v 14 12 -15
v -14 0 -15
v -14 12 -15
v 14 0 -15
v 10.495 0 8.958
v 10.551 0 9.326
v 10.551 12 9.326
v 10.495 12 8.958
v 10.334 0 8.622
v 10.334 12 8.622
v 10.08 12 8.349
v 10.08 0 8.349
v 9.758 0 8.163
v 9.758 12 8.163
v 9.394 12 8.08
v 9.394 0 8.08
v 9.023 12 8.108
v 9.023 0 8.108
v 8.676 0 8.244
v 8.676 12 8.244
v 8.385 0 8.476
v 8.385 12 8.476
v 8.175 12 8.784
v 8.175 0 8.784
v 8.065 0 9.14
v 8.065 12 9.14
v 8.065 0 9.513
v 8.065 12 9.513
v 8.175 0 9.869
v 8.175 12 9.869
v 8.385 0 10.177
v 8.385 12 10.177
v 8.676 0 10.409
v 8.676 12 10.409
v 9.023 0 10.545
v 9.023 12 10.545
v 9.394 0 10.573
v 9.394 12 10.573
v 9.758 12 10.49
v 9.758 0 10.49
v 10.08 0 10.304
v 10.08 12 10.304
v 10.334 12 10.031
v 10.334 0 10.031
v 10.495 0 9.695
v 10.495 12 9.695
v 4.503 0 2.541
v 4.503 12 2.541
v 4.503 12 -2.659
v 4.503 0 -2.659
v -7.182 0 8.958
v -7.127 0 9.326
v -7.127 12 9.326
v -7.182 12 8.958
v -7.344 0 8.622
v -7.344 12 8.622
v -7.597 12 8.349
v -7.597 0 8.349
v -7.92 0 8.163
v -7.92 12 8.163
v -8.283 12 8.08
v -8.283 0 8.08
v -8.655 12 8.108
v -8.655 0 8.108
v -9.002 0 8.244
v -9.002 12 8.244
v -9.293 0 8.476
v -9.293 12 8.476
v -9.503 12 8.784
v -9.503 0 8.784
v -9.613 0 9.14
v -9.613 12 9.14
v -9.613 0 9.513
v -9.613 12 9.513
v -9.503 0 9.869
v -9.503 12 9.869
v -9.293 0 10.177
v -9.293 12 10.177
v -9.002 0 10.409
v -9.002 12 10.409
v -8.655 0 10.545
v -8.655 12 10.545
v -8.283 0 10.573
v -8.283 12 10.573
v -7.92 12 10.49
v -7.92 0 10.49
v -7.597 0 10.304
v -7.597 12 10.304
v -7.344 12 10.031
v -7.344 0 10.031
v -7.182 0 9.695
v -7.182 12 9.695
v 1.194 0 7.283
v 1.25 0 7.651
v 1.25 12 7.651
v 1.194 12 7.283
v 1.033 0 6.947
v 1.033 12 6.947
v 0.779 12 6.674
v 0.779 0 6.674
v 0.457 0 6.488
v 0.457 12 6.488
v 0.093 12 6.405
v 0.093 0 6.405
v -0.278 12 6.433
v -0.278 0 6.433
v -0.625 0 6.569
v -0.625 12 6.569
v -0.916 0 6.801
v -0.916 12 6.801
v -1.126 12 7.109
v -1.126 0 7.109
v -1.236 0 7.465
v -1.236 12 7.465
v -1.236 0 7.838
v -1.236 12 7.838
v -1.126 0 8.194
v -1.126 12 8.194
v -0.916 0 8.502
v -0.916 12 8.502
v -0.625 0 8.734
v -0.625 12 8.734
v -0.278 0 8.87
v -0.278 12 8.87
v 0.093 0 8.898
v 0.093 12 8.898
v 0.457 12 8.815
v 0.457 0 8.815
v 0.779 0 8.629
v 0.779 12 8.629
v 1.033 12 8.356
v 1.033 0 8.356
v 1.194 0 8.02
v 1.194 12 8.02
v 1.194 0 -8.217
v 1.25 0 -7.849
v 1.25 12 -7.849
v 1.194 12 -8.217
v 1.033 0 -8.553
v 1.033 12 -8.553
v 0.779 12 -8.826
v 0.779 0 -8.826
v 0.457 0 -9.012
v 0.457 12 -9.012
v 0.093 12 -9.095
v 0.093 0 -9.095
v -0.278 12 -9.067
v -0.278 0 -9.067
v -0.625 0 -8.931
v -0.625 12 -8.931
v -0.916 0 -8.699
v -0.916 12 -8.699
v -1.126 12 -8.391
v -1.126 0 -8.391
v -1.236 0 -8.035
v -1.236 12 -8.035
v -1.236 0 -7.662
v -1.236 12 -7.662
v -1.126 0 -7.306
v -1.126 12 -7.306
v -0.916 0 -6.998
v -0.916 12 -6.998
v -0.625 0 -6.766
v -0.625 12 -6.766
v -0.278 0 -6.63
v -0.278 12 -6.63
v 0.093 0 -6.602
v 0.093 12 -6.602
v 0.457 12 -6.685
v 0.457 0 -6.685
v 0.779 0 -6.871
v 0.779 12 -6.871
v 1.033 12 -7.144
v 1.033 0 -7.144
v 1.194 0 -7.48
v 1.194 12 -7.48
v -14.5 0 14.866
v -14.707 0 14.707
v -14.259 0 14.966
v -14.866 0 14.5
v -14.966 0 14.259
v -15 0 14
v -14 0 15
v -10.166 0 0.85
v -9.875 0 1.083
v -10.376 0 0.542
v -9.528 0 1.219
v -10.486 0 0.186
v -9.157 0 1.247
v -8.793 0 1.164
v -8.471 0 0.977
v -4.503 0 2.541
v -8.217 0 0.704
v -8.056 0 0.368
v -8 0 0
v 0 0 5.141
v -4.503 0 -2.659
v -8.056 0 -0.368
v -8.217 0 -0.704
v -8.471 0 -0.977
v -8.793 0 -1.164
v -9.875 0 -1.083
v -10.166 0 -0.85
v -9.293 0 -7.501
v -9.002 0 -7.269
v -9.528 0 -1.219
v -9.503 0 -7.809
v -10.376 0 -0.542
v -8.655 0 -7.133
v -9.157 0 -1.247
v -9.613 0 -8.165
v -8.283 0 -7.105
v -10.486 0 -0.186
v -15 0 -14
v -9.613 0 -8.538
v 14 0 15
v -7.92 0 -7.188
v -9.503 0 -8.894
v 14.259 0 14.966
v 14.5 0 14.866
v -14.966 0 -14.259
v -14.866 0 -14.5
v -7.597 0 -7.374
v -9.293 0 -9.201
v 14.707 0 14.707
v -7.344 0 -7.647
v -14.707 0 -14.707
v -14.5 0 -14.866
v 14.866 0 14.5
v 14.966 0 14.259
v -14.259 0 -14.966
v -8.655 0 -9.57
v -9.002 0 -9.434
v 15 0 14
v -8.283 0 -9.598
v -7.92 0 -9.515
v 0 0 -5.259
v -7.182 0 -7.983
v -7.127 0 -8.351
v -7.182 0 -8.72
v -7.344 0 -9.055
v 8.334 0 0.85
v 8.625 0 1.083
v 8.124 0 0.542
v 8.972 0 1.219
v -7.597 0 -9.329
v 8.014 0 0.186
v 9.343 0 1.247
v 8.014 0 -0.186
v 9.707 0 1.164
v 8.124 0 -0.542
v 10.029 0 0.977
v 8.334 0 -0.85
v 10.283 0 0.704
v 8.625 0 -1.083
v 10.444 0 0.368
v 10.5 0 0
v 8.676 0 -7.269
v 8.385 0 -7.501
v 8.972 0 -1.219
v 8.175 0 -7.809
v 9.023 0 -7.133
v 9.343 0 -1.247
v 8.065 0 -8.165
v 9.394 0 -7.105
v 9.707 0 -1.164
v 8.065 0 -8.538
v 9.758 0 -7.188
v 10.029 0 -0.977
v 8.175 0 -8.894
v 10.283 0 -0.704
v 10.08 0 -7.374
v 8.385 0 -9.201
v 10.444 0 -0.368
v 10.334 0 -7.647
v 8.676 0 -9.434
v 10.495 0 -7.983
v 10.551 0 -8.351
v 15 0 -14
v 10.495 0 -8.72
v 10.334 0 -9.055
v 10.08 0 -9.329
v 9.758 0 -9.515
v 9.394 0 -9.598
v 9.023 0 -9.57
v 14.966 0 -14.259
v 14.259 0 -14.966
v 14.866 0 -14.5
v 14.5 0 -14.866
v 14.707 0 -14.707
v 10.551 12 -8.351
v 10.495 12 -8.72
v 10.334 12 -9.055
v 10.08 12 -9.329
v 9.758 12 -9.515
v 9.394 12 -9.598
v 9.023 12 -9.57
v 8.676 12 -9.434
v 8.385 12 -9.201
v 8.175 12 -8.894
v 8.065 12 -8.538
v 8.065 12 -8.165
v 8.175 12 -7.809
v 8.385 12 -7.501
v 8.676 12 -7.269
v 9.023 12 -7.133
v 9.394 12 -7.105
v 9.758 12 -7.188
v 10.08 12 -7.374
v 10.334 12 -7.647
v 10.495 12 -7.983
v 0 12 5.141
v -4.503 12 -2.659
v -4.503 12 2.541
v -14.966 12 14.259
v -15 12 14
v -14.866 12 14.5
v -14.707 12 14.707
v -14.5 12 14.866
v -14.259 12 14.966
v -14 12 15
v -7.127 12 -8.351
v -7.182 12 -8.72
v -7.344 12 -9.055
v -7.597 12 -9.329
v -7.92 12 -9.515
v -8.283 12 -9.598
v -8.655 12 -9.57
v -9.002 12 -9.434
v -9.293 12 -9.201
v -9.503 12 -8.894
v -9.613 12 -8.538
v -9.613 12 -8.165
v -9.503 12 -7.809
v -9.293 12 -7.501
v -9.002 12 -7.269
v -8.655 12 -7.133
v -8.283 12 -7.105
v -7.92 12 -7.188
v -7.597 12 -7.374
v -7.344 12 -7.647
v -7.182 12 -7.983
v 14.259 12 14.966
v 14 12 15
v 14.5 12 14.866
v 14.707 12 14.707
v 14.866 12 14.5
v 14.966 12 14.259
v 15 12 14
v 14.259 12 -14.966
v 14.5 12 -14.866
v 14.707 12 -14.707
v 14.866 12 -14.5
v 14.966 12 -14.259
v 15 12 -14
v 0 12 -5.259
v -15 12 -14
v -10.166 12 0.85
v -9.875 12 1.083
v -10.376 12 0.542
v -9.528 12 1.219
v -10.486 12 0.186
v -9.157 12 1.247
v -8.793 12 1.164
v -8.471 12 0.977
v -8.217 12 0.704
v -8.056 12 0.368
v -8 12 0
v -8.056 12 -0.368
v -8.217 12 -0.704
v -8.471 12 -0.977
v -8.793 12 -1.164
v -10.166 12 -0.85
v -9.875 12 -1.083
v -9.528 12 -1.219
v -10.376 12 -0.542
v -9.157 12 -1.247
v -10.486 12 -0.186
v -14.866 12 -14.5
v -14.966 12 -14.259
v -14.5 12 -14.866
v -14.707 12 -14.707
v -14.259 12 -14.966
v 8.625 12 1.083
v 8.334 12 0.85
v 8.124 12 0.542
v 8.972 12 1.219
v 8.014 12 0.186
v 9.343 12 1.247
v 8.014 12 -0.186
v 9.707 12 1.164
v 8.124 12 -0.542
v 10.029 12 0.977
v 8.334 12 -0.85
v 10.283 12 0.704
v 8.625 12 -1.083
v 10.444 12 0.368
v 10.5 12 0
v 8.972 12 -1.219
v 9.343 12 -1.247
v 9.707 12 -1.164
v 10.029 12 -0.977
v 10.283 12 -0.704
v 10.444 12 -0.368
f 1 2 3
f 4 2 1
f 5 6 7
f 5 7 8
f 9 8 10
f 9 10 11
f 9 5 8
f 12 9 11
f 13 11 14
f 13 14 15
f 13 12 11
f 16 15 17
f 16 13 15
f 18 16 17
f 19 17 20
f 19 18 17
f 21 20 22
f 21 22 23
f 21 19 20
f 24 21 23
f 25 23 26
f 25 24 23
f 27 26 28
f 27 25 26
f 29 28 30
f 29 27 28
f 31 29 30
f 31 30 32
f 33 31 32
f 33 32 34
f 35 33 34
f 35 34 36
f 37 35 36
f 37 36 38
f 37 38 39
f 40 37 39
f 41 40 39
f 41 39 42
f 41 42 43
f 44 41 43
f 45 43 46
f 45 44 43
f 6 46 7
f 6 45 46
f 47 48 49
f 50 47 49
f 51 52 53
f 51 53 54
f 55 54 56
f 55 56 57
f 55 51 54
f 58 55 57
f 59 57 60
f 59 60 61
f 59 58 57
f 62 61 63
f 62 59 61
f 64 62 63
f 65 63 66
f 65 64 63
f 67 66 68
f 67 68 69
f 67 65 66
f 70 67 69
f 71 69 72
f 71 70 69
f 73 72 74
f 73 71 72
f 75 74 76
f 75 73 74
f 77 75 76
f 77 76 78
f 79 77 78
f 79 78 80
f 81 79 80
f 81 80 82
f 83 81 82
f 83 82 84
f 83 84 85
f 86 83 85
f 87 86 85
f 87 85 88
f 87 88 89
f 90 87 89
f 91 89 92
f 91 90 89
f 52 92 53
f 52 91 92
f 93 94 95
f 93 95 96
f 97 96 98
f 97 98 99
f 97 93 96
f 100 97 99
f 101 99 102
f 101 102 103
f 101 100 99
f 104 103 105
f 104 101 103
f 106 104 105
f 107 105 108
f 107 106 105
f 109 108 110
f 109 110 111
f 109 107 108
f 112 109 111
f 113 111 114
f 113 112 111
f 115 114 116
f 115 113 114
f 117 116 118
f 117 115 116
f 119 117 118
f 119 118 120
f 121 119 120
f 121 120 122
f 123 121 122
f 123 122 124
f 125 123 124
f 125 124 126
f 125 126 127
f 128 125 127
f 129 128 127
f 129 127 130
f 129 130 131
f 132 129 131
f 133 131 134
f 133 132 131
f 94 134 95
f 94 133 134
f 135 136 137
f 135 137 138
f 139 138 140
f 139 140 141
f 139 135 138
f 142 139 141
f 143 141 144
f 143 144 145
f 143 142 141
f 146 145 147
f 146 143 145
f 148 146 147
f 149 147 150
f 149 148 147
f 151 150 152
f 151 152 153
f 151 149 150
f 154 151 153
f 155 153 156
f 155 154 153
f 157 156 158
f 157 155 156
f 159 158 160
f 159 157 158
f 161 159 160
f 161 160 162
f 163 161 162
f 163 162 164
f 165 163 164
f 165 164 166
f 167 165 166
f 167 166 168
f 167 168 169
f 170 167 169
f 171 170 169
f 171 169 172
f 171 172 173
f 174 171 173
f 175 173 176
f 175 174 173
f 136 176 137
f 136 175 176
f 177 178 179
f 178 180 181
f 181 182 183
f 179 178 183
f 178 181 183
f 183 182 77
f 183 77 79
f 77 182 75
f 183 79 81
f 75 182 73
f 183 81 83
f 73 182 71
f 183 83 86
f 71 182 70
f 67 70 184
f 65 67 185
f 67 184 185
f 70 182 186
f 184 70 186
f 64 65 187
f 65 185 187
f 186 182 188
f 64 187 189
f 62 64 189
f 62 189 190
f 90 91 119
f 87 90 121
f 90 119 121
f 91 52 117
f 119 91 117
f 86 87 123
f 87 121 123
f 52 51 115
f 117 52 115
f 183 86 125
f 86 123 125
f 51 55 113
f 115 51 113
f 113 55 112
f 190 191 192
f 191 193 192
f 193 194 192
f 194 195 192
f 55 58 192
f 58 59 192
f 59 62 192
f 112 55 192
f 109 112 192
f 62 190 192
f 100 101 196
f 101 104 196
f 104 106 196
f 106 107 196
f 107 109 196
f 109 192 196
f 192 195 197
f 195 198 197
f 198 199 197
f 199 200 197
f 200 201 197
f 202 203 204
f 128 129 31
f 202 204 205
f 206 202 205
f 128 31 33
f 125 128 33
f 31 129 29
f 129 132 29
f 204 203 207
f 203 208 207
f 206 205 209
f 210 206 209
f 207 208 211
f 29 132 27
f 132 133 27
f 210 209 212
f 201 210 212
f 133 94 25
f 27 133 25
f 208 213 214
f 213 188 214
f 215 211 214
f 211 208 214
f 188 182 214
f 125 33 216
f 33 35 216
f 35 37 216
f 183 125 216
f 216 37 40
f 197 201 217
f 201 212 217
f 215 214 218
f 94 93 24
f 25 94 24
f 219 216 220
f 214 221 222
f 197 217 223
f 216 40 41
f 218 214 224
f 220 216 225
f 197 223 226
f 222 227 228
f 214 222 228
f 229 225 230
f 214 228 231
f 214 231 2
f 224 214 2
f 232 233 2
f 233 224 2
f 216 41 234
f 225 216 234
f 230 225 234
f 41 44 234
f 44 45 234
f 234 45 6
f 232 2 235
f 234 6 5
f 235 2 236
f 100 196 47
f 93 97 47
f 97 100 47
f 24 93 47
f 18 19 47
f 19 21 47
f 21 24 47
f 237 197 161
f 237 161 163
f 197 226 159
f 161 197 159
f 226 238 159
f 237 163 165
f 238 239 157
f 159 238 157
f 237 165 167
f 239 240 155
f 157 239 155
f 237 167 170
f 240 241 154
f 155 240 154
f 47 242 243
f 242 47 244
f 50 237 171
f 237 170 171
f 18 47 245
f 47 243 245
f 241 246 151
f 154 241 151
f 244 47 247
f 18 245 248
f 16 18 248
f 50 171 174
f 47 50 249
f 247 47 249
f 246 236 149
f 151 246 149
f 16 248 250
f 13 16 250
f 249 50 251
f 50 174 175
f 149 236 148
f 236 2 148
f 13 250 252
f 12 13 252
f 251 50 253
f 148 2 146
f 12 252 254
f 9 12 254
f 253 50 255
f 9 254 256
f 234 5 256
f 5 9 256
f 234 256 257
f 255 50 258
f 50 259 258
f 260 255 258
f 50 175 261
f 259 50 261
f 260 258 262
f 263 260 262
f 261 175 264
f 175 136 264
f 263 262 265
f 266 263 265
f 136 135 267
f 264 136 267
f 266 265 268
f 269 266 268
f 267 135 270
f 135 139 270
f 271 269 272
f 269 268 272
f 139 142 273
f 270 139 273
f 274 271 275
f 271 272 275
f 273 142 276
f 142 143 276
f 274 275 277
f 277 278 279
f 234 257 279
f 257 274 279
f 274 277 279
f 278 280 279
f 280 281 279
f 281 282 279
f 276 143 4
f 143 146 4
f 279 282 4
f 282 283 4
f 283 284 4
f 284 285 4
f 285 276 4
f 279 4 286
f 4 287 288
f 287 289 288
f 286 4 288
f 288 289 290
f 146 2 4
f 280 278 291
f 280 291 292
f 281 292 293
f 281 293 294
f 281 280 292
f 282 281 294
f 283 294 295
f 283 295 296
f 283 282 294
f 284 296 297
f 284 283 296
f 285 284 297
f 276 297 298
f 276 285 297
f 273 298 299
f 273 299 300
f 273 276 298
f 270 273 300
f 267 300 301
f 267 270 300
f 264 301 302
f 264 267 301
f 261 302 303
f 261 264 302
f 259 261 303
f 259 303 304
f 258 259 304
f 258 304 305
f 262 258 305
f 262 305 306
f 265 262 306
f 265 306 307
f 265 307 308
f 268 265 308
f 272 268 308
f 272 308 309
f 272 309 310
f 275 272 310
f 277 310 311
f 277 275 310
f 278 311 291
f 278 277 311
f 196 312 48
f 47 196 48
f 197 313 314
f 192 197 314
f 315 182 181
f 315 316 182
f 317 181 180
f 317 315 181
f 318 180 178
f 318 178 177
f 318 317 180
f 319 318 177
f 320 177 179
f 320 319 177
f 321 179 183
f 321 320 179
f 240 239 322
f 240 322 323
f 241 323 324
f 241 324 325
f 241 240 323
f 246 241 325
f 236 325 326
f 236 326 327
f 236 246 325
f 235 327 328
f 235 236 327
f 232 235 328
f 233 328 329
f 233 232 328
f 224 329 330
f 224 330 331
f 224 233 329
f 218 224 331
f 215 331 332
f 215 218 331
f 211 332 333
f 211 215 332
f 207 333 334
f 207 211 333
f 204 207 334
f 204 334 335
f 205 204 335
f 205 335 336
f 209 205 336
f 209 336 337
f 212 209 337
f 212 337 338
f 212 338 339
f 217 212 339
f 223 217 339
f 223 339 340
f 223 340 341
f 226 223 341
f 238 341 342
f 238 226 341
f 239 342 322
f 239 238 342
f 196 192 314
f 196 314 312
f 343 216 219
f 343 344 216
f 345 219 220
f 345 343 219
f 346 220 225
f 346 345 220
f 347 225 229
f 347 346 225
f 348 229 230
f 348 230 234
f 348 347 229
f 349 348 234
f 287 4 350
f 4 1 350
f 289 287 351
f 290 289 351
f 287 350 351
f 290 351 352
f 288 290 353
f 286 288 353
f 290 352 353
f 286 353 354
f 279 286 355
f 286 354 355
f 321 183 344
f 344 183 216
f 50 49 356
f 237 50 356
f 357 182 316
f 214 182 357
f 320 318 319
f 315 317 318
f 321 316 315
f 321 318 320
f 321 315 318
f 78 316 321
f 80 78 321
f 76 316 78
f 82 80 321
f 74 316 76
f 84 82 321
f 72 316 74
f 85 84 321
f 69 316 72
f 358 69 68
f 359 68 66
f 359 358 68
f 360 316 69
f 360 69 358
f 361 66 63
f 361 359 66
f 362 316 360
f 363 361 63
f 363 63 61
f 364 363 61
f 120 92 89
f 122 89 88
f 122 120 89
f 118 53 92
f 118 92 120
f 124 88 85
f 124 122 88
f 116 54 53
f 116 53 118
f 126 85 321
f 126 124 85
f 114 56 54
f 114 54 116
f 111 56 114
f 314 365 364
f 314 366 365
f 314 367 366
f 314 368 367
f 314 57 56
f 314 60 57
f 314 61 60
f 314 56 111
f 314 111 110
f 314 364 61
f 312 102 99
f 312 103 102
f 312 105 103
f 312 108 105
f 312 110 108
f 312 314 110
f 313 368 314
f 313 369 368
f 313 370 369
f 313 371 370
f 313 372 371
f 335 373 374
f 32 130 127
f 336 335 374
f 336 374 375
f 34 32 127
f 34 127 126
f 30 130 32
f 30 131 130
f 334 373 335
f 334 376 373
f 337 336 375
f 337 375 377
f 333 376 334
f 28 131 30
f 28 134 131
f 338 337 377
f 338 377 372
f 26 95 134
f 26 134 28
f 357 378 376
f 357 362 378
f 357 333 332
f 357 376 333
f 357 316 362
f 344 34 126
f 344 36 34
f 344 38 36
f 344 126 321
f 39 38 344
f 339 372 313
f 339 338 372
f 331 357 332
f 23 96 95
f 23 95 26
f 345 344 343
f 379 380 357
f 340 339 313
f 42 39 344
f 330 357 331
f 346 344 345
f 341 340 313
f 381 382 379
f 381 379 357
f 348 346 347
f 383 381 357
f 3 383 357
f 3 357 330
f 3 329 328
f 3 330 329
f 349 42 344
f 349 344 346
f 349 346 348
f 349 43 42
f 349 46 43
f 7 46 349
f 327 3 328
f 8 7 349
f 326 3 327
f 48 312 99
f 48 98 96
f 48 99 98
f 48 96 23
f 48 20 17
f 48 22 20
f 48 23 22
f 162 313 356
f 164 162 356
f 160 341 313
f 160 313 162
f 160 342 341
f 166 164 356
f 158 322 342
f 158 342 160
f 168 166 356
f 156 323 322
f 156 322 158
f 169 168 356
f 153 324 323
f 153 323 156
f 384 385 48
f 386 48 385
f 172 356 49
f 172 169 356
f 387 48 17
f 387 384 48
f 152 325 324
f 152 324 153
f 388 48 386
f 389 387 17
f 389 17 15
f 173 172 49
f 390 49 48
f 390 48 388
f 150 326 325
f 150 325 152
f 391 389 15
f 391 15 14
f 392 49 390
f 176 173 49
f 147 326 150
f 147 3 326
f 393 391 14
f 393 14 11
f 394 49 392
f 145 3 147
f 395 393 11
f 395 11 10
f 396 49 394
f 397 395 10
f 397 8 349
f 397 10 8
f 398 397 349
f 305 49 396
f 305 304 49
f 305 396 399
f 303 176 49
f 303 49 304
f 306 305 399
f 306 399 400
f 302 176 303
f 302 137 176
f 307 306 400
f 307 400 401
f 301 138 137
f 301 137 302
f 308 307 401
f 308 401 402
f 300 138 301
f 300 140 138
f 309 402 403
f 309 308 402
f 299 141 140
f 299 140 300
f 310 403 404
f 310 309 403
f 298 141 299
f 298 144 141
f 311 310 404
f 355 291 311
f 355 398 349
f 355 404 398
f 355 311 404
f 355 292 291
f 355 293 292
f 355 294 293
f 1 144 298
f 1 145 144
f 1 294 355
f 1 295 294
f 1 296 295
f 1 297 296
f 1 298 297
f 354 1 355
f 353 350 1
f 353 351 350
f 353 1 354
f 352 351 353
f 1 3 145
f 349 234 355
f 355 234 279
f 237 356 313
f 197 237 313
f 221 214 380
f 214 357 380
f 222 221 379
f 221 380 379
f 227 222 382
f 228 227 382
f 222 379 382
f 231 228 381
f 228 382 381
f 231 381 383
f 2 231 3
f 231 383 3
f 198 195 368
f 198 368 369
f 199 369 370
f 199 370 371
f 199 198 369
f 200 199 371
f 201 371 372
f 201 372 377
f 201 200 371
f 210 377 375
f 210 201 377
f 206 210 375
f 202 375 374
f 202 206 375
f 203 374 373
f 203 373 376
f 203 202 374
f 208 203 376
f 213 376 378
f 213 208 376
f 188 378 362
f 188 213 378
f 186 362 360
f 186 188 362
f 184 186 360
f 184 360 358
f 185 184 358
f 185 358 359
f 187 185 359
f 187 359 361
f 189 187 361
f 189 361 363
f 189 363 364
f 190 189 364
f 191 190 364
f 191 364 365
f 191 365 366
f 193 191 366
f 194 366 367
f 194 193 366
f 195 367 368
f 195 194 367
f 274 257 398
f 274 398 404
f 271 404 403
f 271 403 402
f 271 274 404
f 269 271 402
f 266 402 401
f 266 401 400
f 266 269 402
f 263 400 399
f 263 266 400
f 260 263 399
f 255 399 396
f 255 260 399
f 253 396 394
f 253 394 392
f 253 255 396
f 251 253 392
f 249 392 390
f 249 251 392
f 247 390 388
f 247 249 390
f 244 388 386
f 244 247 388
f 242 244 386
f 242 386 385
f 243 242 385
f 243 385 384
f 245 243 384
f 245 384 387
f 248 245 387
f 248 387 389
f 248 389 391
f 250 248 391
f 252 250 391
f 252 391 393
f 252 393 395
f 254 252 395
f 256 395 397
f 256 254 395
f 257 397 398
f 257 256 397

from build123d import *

# Parameters (mm, degrees)
SKETCH1_W           = 30
SKETCH1_H           = 30
SKETCH1_R           = 1.25
BOSS_EXTRUDE2_DEPTH = 12
FILLET1_R           = 1


with BuildPart() as part:
    # Sketch1 → Boss-Extrude2 (new body)
    with BuildSketch(Plane(origin=(0, 0, 0), x_dir=(1, 0, 0), z_dir=(0, 1, 0))):
        Rectangle(SKETCH1_W, SKETCH1_H)
        with Locations((-9.25, 0)):
            Circle(SKETCH1_R, mode=Mode.SUBTRACT)
        with Locations((9.25, 0)):
            Circle(SKETCH1_R, mode=Mode.SUBTRACT)
        with Locations((0, 7.848591319)):
            Circle(SKETCH1_R, mode=Mode.SUBTRACT)
        with Locations((0, -7.651408681)):
            Circle(SKETCH1_R, mode=Mode.SUBTRACT)
        with Locations((9.300881955, 8.35126307)):
            Circle(SKETCH1_R, mode=Mode.SUBTRACT)
        with Locations((9.300881955, -9.32640646)):
            Circle(SKETCH1_R, mode=Mode.SUBTRACT)
        with Locations((-8.376787575, -9.32640646)):
            Circle(SKETCH1_R, mode=Mode.SUBTRACT)
        with Locations((-8.376787575, 8.35126307)):
            Circle(SKETCH1_R, mode=Mode.SUBTRACT)
        Polygon((4.5033321, -2.54076447), (4.5033321, 2.65923553), (0, 5.25923553), (-4.5033321, 2.65923553), (-4.5033321, -2.54076447), (0, -5.14076447), align=None, mode=Mode.SUBTRACT)
    extrude(amount=BOSS_EXTRUDE2_DEPTH)

    # Fillet1
    fillet1_edges = [part.edges().sort_by_distance(p)[0] for p in [
        (15, 6, 15),
        (-15, 6, 15),
        (-15, 6, -15),
        (15, 6, -15),
    ]]
    fillet(fillet1_edges, radius=FILLET1_R)


solid = part.part
